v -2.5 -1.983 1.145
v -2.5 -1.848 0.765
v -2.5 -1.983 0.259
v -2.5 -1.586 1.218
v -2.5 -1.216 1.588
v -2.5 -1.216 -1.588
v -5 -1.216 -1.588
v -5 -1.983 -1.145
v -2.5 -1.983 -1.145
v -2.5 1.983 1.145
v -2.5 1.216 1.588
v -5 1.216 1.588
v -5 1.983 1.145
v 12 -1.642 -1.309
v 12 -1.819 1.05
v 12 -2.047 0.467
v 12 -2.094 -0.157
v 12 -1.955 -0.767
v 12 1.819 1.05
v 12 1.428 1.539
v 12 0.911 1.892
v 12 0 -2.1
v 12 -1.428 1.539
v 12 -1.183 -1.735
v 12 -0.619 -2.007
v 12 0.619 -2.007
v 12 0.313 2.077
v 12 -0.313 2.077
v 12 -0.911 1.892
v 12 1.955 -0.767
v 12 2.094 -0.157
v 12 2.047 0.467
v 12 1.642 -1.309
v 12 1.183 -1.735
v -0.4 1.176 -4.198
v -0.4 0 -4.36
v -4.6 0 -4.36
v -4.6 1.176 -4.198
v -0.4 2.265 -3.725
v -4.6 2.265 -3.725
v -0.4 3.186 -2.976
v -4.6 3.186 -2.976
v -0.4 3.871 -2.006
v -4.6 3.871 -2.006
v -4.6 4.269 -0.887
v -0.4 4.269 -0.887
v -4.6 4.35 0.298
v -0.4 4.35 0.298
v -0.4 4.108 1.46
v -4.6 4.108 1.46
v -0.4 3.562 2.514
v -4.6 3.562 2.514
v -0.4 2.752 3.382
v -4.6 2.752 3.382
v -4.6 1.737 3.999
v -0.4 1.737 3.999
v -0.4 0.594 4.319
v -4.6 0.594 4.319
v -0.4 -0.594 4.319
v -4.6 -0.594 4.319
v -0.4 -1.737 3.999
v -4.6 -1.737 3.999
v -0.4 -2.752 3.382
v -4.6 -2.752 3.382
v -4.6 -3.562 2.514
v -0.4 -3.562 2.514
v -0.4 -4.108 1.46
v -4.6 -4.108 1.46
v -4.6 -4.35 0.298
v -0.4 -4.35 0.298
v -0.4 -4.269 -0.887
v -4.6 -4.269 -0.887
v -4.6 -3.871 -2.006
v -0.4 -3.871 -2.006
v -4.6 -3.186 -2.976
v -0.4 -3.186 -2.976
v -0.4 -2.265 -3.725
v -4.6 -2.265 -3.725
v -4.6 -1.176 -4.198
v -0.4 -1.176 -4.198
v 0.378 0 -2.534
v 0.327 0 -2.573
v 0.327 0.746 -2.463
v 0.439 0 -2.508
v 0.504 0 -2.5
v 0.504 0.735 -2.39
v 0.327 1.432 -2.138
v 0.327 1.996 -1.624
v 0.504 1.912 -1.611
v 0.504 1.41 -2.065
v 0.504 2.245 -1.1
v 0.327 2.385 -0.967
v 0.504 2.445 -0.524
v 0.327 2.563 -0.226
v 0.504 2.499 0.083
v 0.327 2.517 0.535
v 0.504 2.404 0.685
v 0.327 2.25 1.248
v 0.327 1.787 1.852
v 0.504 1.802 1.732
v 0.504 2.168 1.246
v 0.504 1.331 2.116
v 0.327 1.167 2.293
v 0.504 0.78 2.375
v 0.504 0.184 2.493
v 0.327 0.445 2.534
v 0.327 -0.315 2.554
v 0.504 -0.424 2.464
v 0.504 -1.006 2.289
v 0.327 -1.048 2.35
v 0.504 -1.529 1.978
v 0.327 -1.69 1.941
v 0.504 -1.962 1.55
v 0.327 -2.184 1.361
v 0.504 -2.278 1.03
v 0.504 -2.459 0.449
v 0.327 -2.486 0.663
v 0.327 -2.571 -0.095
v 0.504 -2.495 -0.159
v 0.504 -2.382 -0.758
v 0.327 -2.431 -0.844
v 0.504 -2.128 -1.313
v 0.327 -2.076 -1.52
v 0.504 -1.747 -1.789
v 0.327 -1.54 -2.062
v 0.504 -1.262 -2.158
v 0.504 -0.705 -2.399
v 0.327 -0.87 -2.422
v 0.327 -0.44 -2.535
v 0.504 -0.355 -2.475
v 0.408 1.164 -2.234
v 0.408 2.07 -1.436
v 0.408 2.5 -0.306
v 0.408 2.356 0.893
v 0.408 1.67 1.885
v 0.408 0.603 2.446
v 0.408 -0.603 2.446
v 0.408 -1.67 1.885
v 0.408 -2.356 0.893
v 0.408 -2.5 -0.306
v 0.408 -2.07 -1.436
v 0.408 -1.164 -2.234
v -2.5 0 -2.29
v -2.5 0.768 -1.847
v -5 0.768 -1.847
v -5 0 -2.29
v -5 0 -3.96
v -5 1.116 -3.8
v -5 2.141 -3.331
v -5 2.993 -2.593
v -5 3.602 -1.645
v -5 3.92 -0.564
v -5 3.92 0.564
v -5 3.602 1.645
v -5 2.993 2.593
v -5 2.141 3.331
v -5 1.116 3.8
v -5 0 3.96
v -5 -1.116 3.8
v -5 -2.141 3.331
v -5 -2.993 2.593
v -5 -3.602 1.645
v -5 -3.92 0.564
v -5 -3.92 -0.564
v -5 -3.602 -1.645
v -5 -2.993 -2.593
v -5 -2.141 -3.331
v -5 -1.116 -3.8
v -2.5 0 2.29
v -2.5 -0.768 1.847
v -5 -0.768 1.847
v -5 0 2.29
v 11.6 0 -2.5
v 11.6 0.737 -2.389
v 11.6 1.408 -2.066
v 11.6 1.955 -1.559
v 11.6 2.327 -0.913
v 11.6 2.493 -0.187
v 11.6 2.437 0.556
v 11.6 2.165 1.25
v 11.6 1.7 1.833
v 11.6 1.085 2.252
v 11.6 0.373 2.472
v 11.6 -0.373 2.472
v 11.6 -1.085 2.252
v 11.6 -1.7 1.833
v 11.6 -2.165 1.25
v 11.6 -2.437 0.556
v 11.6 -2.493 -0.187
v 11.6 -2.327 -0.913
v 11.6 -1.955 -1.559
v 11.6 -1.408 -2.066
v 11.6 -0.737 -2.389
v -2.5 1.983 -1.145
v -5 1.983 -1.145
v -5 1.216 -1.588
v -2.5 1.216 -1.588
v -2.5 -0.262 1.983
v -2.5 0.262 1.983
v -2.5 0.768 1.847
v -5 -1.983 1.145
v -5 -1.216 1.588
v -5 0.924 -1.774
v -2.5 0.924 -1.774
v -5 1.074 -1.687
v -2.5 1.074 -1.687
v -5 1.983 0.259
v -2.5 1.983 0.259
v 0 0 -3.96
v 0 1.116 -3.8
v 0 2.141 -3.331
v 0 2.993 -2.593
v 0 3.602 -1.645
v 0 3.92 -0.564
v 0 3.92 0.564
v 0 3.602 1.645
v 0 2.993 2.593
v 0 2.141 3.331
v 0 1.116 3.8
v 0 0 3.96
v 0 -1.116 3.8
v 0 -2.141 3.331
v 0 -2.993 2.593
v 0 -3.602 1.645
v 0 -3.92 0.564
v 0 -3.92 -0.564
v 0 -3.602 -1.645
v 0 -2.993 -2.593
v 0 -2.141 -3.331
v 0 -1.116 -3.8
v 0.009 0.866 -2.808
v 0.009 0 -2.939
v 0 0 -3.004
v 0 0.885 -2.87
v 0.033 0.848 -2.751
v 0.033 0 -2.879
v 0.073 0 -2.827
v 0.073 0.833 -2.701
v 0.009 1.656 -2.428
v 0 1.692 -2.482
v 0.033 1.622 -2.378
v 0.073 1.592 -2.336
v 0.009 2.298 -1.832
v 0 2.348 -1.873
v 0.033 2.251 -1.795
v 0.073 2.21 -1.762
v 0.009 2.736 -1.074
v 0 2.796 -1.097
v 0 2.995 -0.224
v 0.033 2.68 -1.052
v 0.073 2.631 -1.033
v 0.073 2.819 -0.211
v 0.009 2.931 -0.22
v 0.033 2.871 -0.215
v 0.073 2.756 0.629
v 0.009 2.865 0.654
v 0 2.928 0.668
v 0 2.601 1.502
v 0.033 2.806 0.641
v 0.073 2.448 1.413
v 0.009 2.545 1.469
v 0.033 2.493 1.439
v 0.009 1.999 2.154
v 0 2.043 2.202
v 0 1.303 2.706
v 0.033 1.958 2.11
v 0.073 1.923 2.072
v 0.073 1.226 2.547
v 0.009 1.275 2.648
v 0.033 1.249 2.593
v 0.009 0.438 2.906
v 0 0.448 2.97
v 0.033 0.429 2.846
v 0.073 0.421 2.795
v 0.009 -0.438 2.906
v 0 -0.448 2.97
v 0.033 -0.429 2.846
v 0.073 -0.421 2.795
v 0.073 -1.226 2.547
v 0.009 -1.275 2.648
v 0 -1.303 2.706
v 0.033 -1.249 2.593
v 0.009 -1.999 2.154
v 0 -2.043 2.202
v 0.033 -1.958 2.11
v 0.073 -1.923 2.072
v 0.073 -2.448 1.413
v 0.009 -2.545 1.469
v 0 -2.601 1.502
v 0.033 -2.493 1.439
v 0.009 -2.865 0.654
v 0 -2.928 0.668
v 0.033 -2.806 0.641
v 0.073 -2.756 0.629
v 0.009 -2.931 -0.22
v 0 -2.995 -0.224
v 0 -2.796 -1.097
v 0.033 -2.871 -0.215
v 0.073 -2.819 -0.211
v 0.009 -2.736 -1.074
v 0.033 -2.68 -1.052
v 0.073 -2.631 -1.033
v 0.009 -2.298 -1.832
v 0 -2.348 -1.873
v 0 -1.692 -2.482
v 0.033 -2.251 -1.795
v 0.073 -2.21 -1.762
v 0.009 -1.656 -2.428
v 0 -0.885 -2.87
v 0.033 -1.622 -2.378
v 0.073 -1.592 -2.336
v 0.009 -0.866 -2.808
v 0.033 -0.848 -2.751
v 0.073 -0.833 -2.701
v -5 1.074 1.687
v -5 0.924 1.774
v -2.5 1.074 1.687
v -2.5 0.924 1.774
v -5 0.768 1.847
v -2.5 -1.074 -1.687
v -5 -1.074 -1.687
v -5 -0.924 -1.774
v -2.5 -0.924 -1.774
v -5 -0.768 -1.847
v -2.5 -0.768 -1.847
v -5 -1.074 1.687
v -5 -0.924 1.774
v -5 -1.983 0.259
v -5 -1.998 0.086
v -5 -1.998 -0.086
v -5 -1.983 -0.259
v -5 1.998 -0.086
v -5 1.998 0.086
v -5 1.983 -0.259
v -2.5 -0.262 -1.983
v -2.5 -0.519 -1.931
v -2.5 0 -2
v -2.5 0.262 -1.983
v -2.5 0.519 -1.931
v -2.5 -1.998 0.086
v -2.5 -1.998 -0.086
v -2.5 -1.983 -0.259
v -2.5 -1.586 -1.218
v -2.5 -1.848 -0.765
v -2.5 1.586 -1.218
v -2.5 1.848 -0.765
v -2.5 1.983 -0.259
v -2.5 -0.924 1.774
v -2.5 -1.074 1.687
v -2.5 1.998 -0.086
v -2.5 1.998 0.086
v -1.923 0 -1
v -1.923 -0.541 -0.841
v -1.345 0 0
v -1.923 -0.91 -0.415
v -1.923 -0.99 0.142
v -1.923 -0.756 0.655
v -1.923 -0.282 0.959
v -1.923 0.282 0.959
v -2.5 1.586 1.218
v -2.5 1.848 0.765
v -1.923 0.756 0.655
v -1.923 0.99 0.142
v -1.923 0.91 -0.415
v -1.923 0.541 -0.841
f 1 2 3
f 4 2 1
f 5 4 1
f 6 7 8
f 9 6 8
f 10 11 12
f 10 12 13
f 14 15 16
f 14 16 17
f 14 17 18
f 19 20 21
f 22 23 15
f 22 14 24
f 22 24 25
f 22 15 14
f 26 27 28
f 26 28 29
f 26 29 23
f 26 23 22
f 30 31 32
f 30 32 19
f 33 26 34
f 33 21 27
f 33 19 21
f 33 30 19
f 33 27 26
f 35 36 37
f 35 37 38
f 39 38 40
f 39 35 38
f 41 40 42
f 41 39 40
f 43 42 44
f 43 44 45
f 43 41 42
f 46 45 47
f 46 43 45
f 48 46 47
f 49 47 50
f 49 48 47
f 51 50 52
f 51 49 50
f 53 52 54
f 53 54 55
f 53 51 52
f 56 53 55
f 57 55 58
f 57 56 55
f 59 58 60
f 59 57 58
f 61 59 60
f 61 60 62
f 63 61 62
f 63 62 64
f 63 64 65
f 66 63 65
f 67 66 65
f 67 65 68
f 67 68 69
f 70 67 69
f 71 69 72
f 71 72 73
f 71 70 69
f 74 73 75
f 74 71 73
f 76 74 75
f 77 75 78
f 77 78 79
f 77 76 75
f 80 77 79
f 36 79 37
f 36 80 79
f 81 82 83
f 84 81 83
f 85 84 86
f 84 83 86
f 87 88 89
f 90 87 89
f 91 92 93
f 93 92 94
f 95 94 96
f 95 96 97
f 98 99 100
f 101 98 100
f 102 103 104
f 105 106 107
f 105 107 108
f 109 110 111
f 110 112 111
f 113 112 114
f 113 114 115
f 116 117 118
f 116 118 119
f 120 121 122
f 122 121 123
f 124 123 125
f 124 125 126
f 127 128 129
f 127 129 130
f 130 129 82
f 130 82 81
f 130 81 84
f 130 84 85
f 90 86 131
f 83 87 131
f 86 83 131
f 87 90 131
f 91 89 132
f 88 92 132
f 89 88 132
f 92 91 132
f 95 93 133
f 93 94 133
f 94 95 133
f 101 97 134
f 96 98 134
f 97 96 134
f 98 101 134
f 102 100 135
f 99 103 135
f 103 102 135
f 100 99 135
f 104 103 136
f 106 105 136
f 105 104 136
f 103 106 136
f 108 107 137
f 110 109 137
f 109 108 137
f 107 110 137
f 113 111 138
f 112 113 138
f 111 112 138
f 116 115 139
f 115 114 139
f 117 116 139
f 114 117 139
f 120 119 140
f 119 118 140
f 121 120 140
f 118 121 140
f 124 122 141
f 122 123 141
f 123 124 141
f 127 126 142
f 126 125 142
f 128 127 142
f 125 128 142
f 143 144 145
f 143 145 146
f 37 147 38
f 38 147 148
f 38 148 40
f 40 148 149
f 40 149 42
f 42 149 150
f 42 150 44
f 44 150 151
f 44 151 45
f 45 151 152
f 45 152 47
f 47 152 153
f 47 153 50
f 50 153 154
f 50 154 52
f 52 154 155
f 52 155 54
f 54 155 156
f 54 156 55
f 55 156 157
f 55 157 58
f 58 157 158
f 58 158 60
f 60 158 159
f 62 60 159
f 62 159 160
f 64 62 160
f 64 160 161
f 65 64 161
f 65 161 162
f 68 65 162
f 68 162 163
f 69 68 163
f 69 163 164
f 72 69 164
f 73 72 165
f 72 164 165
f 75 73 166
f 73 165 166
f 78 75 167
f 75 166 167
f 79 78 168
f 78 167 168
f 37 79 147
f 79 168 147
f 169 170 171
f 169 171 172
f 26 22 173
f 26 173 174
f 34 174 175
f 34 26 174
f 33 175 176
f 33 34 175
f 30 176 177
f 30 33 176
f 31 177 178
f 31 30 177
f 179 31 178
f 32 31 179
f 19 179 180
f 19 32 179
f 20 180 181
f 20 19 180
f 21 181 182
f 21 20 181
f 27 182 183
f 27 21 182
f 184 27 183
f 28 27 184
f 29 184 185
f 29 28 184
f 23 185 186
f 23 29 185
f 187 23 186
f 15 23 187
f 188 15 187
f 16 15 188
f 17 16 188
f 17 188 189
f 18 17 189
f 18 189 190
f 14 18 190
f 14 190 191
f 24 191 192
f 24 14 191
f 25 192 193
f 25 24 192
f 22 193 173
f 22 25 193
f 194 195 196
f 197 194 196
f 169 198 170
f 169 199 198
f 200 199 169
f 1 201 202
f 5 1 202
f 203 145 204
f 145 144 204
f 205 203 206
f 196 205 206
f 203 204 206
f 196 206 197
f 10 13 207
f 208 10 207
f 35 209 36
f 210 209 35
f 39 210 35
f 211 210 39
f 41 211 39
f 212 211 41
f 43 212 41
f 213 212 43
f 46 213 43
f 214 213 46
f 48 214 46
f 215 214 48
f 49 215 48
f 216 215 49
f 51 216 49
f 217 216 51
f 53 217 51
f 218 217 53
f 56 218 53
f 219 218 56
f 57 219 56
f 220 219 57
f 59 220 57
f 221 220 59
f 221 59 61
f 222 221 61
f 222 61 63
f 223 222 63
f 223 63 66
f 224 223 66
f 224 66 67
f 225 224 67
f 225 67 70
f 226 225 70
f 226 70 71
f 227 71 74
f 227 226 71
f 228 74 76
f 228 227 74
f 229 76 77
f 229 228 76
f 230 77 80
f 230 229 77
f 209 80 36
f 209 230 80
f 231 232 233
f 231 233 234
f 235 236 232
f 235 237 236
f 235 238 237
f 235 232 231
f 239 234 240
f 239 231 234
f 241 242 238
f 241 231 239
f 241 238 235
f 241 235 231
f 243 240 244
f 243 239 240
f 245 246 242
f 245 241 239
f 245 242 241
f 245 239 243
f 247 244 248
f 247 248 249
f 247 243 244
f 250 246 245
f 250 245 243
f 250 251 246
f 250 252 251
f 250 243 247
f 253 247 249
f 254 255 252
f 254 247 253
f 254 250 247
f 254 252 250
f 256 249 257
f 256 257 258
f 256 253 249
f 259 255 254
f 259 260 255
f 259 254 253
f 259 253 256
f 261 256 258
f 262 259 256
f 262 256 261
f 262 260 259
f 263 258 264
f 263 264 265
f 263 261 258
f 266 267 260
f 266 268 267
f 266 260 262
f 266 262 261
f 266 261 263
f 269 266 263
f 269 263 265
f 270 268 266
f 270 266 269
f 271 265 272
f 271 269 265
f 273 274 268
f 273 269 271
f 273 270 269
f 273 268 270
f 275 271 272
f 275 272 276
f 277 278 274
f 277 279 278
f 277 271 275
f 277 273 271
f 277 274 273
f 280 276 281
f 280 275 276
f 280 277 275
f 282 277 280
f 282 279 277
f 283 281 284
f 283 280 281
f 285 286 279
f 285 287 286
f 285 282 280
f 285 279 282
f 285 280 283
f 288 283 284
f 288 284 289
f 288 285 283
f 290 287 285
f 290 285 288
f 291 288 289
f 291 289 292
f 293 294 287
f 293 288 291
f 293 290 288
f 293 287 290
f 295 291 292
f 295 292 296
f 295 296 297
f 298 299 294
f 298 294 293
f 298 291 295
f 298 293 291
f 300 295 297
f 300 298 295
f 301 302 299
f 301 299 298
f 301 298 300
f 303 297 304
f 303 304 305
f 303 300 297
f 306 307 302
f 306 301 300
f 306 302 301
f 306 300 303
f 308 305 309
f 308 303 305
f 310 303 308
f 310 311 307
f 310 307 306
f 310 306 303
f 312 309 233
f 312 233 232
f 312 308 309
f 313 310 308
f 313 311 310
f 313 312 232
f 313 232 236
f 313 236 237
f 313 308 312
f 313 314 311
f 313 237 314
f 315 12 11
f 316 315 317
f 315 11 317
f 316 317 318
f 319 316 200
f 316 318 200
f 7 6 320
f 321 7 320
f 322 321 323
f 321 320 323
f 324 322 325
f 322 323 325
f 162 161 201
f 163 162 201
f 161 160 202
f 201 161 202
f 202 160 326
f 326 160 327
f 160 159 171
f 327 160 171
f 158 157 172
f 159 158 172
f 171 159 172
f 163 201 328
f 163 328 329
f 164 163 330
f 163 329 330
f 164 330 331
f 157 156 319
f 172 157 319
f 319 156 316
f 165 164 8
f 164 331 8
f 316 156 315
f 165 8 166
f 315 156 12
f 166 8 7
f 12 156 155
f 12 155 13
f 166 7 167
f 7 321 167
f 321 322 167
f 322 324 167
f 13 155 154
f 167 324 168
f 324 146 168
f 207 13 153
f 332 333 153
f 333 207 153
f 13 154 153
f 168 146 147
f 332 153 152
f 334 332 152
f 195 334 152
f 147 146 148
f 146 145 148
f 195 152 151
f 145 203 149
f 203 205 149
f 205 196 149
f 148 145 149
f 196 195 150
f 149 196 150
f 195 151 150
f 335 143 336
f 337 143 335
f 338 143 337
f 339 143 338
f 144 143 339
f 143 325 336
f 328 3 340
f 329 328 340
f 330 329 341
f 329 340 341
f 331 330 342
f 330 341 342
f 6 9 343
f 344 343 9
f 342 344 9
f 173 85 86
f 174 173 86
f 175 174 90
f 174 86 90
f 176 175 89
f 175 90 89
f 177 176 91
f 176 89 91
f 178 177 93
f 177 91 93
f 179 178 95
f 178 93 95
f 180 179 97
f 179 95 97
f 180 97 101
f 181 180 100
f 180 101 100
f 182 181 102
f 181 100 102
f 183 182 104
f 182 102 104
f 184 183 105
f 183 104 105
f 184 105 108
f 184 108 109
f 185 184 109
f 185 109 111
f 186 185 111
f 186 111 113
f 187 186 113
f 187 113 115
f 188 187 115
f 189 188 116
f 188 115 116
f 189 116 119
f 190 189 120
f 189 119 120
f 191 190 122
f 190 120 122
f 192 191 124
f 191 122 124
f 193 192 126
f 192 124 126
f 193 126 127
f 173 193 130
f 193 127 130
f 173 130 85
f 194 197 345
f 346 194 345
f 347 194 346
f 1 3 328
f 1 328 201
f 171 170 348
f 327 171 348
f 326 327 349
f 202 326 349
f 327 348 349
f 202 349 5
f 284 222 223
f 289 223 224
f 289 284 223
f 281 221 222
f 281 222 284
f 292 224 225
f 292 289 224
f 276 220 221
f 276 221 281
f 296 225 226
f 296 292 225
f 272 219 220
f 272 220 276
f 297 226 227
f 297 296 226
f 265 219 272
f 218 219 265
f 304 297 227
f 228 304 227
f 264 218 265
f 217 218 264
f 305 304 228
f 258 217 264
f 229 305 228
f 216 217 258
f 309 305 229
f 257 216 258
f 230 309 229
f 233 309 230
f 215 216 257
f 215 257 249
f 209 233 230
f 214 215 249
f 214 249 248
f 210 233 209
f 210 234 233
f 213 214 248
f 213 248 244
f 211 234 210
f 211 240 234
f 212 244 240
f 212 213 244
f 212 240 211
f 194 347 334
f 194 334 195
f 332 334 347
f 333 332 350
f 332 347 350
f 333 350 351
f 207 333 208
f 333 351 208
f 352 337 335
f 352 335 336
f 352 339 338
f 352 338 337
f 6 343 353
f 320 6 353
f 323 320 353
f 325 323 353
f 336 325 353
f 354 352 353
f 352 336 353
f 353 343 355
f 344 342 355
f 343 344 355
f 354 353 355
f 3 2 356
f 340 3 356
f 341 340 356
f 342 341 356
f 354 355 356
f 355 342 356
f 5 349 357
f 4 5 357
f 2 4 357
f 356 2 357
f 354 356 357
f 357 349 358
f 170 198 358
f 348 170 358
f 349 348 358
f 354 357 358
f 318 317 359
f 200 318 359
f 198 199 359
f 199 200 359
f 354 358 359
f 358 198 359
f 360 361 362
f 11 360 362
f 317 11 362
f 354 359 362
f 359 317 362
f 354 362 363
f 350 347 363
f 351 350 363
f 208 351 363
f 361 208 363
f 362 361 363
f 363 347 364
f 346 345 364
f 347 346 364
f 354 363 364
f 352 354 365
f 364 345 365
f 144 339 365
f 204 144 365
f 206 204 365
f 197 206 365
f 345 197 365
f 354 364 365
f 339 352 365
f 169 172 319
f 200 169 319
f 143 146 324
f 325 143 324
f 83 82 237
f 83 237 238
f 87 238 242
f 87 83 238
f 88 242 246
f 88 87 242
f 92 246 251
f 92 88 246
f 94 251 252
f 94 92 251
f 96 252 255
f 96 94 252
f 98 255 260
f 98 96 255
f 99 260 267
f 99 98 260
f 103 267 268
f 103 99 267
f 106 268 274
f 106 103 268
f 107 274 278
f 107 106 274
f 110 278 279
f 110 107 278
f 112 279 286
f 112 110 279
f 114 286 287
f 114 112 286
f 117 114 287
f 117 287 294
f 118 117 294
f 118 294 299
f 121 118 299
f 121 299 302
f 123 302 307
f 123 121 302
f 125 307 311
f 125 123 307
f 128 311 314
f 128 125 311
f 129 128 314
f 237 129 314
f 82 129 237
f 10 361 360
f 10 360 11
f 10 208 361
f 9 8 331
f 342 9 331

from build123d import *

# Parameters (mm, degrees)
SKETCH_1_R                  = 4.36
EXTRUDE_1_DEPTH             = 5
HOLE_WIZARD_1_5_1_5_1_D     = 4
HOLE_WIZARD_1_5_1_5_1_DEPTH = 2.5
HOLE_WIZARD_1_5_1_5_1_TIP   = 1.154700538
CUT_EXTRUDE_1_DEPTH         = 2.5
SKETCH_4_R                  = 2.5
EXTRUDE_2_DEPTH             = 12
CHAMFER_1_SIZE              = 0.4
FILLET_1_R                  = 0.25


with BuildPart() as part:
    # 草圖1 → 伸長1 (new body)
    with BuildSketch(Plane(origin=(0, 0, 0), x_dir=(0, 0, -1), z_dir=(1, 0, 0))):
        Circle(SKETCH_1_R)
    extrude(amount=-EXTRUDE_1_DEPTH)

    # Ø1.5 (1.5) 直徑孔1
    with Locations(Plane(origin=(-5, 0, 0), x_dir=(0, 0, -1), z_dir=(-1, 0, 0))):
        with Locations((0, 0)):
            Hole(HOLE_WIZARD_1_5_1_5_1_D / 2, depth=HOLE_WIZARD_1_5_1_5_1_DEPTH)
            with Locations((0, 0, -(HOLE_WIZARD_1_5_1_5_1_DEPTH + HOLE_WIZARD_1_5_1_5_1_TIP / 2))):  # 120° drill point
                Cone(0, HOLE_WIZARD_1_5_1_5_1_D / 2, HOLE_WIZARD_1_5_1_5_1_TIP, mode=Mode.SUBTRACT)

    # 草圖3 → 除料-伸長1 (cut)
    with BuildSketch(Plane.ZY.offset(5)):
        Polygon((2.29, 0), (1.145, 1.983198175), (-1.145, 1.983198175), (-2.29, 0), (-1.145, -1.983198175), (1.145, -1.983198175), align=None)
    extrude(amount=-CUT_EXTRUDE_1_DEPTH, mode=Mode.SUBTRACT)

    # 草圖4 → 伸長2 (add)
    with BuildSketch(Plane(origin=(0, 0, 0), x_dir=(0, 0, -1), z_dir=(1, 0, 0))):
        Circle(SKETCH_4_R)
    extrude(amount=EXTRUDE_2_DEPTH)

    # 導角1
    chamfer_1_edges = [part.edges().sort_by_distance(p)[0] for p in [
        (0, 0, 4.36),
        (-5, 0, 4.36),
        (0, 0, 2.5),
        (12, 0, 2.5),
    ]]
    chamfer(chamfer_1_edges, length=CHAMFER_1_SIZE)

    # 圓角1
    fillet_1_edges = [part.edges().sort_by_distance(p)[0] for p in [
        (0.4, 0, 2.5),
        (0, 0, 2.9),
    ]]
    fillet(fillet_1_edges, radius=FILLET_1_R)


solid = part.part
